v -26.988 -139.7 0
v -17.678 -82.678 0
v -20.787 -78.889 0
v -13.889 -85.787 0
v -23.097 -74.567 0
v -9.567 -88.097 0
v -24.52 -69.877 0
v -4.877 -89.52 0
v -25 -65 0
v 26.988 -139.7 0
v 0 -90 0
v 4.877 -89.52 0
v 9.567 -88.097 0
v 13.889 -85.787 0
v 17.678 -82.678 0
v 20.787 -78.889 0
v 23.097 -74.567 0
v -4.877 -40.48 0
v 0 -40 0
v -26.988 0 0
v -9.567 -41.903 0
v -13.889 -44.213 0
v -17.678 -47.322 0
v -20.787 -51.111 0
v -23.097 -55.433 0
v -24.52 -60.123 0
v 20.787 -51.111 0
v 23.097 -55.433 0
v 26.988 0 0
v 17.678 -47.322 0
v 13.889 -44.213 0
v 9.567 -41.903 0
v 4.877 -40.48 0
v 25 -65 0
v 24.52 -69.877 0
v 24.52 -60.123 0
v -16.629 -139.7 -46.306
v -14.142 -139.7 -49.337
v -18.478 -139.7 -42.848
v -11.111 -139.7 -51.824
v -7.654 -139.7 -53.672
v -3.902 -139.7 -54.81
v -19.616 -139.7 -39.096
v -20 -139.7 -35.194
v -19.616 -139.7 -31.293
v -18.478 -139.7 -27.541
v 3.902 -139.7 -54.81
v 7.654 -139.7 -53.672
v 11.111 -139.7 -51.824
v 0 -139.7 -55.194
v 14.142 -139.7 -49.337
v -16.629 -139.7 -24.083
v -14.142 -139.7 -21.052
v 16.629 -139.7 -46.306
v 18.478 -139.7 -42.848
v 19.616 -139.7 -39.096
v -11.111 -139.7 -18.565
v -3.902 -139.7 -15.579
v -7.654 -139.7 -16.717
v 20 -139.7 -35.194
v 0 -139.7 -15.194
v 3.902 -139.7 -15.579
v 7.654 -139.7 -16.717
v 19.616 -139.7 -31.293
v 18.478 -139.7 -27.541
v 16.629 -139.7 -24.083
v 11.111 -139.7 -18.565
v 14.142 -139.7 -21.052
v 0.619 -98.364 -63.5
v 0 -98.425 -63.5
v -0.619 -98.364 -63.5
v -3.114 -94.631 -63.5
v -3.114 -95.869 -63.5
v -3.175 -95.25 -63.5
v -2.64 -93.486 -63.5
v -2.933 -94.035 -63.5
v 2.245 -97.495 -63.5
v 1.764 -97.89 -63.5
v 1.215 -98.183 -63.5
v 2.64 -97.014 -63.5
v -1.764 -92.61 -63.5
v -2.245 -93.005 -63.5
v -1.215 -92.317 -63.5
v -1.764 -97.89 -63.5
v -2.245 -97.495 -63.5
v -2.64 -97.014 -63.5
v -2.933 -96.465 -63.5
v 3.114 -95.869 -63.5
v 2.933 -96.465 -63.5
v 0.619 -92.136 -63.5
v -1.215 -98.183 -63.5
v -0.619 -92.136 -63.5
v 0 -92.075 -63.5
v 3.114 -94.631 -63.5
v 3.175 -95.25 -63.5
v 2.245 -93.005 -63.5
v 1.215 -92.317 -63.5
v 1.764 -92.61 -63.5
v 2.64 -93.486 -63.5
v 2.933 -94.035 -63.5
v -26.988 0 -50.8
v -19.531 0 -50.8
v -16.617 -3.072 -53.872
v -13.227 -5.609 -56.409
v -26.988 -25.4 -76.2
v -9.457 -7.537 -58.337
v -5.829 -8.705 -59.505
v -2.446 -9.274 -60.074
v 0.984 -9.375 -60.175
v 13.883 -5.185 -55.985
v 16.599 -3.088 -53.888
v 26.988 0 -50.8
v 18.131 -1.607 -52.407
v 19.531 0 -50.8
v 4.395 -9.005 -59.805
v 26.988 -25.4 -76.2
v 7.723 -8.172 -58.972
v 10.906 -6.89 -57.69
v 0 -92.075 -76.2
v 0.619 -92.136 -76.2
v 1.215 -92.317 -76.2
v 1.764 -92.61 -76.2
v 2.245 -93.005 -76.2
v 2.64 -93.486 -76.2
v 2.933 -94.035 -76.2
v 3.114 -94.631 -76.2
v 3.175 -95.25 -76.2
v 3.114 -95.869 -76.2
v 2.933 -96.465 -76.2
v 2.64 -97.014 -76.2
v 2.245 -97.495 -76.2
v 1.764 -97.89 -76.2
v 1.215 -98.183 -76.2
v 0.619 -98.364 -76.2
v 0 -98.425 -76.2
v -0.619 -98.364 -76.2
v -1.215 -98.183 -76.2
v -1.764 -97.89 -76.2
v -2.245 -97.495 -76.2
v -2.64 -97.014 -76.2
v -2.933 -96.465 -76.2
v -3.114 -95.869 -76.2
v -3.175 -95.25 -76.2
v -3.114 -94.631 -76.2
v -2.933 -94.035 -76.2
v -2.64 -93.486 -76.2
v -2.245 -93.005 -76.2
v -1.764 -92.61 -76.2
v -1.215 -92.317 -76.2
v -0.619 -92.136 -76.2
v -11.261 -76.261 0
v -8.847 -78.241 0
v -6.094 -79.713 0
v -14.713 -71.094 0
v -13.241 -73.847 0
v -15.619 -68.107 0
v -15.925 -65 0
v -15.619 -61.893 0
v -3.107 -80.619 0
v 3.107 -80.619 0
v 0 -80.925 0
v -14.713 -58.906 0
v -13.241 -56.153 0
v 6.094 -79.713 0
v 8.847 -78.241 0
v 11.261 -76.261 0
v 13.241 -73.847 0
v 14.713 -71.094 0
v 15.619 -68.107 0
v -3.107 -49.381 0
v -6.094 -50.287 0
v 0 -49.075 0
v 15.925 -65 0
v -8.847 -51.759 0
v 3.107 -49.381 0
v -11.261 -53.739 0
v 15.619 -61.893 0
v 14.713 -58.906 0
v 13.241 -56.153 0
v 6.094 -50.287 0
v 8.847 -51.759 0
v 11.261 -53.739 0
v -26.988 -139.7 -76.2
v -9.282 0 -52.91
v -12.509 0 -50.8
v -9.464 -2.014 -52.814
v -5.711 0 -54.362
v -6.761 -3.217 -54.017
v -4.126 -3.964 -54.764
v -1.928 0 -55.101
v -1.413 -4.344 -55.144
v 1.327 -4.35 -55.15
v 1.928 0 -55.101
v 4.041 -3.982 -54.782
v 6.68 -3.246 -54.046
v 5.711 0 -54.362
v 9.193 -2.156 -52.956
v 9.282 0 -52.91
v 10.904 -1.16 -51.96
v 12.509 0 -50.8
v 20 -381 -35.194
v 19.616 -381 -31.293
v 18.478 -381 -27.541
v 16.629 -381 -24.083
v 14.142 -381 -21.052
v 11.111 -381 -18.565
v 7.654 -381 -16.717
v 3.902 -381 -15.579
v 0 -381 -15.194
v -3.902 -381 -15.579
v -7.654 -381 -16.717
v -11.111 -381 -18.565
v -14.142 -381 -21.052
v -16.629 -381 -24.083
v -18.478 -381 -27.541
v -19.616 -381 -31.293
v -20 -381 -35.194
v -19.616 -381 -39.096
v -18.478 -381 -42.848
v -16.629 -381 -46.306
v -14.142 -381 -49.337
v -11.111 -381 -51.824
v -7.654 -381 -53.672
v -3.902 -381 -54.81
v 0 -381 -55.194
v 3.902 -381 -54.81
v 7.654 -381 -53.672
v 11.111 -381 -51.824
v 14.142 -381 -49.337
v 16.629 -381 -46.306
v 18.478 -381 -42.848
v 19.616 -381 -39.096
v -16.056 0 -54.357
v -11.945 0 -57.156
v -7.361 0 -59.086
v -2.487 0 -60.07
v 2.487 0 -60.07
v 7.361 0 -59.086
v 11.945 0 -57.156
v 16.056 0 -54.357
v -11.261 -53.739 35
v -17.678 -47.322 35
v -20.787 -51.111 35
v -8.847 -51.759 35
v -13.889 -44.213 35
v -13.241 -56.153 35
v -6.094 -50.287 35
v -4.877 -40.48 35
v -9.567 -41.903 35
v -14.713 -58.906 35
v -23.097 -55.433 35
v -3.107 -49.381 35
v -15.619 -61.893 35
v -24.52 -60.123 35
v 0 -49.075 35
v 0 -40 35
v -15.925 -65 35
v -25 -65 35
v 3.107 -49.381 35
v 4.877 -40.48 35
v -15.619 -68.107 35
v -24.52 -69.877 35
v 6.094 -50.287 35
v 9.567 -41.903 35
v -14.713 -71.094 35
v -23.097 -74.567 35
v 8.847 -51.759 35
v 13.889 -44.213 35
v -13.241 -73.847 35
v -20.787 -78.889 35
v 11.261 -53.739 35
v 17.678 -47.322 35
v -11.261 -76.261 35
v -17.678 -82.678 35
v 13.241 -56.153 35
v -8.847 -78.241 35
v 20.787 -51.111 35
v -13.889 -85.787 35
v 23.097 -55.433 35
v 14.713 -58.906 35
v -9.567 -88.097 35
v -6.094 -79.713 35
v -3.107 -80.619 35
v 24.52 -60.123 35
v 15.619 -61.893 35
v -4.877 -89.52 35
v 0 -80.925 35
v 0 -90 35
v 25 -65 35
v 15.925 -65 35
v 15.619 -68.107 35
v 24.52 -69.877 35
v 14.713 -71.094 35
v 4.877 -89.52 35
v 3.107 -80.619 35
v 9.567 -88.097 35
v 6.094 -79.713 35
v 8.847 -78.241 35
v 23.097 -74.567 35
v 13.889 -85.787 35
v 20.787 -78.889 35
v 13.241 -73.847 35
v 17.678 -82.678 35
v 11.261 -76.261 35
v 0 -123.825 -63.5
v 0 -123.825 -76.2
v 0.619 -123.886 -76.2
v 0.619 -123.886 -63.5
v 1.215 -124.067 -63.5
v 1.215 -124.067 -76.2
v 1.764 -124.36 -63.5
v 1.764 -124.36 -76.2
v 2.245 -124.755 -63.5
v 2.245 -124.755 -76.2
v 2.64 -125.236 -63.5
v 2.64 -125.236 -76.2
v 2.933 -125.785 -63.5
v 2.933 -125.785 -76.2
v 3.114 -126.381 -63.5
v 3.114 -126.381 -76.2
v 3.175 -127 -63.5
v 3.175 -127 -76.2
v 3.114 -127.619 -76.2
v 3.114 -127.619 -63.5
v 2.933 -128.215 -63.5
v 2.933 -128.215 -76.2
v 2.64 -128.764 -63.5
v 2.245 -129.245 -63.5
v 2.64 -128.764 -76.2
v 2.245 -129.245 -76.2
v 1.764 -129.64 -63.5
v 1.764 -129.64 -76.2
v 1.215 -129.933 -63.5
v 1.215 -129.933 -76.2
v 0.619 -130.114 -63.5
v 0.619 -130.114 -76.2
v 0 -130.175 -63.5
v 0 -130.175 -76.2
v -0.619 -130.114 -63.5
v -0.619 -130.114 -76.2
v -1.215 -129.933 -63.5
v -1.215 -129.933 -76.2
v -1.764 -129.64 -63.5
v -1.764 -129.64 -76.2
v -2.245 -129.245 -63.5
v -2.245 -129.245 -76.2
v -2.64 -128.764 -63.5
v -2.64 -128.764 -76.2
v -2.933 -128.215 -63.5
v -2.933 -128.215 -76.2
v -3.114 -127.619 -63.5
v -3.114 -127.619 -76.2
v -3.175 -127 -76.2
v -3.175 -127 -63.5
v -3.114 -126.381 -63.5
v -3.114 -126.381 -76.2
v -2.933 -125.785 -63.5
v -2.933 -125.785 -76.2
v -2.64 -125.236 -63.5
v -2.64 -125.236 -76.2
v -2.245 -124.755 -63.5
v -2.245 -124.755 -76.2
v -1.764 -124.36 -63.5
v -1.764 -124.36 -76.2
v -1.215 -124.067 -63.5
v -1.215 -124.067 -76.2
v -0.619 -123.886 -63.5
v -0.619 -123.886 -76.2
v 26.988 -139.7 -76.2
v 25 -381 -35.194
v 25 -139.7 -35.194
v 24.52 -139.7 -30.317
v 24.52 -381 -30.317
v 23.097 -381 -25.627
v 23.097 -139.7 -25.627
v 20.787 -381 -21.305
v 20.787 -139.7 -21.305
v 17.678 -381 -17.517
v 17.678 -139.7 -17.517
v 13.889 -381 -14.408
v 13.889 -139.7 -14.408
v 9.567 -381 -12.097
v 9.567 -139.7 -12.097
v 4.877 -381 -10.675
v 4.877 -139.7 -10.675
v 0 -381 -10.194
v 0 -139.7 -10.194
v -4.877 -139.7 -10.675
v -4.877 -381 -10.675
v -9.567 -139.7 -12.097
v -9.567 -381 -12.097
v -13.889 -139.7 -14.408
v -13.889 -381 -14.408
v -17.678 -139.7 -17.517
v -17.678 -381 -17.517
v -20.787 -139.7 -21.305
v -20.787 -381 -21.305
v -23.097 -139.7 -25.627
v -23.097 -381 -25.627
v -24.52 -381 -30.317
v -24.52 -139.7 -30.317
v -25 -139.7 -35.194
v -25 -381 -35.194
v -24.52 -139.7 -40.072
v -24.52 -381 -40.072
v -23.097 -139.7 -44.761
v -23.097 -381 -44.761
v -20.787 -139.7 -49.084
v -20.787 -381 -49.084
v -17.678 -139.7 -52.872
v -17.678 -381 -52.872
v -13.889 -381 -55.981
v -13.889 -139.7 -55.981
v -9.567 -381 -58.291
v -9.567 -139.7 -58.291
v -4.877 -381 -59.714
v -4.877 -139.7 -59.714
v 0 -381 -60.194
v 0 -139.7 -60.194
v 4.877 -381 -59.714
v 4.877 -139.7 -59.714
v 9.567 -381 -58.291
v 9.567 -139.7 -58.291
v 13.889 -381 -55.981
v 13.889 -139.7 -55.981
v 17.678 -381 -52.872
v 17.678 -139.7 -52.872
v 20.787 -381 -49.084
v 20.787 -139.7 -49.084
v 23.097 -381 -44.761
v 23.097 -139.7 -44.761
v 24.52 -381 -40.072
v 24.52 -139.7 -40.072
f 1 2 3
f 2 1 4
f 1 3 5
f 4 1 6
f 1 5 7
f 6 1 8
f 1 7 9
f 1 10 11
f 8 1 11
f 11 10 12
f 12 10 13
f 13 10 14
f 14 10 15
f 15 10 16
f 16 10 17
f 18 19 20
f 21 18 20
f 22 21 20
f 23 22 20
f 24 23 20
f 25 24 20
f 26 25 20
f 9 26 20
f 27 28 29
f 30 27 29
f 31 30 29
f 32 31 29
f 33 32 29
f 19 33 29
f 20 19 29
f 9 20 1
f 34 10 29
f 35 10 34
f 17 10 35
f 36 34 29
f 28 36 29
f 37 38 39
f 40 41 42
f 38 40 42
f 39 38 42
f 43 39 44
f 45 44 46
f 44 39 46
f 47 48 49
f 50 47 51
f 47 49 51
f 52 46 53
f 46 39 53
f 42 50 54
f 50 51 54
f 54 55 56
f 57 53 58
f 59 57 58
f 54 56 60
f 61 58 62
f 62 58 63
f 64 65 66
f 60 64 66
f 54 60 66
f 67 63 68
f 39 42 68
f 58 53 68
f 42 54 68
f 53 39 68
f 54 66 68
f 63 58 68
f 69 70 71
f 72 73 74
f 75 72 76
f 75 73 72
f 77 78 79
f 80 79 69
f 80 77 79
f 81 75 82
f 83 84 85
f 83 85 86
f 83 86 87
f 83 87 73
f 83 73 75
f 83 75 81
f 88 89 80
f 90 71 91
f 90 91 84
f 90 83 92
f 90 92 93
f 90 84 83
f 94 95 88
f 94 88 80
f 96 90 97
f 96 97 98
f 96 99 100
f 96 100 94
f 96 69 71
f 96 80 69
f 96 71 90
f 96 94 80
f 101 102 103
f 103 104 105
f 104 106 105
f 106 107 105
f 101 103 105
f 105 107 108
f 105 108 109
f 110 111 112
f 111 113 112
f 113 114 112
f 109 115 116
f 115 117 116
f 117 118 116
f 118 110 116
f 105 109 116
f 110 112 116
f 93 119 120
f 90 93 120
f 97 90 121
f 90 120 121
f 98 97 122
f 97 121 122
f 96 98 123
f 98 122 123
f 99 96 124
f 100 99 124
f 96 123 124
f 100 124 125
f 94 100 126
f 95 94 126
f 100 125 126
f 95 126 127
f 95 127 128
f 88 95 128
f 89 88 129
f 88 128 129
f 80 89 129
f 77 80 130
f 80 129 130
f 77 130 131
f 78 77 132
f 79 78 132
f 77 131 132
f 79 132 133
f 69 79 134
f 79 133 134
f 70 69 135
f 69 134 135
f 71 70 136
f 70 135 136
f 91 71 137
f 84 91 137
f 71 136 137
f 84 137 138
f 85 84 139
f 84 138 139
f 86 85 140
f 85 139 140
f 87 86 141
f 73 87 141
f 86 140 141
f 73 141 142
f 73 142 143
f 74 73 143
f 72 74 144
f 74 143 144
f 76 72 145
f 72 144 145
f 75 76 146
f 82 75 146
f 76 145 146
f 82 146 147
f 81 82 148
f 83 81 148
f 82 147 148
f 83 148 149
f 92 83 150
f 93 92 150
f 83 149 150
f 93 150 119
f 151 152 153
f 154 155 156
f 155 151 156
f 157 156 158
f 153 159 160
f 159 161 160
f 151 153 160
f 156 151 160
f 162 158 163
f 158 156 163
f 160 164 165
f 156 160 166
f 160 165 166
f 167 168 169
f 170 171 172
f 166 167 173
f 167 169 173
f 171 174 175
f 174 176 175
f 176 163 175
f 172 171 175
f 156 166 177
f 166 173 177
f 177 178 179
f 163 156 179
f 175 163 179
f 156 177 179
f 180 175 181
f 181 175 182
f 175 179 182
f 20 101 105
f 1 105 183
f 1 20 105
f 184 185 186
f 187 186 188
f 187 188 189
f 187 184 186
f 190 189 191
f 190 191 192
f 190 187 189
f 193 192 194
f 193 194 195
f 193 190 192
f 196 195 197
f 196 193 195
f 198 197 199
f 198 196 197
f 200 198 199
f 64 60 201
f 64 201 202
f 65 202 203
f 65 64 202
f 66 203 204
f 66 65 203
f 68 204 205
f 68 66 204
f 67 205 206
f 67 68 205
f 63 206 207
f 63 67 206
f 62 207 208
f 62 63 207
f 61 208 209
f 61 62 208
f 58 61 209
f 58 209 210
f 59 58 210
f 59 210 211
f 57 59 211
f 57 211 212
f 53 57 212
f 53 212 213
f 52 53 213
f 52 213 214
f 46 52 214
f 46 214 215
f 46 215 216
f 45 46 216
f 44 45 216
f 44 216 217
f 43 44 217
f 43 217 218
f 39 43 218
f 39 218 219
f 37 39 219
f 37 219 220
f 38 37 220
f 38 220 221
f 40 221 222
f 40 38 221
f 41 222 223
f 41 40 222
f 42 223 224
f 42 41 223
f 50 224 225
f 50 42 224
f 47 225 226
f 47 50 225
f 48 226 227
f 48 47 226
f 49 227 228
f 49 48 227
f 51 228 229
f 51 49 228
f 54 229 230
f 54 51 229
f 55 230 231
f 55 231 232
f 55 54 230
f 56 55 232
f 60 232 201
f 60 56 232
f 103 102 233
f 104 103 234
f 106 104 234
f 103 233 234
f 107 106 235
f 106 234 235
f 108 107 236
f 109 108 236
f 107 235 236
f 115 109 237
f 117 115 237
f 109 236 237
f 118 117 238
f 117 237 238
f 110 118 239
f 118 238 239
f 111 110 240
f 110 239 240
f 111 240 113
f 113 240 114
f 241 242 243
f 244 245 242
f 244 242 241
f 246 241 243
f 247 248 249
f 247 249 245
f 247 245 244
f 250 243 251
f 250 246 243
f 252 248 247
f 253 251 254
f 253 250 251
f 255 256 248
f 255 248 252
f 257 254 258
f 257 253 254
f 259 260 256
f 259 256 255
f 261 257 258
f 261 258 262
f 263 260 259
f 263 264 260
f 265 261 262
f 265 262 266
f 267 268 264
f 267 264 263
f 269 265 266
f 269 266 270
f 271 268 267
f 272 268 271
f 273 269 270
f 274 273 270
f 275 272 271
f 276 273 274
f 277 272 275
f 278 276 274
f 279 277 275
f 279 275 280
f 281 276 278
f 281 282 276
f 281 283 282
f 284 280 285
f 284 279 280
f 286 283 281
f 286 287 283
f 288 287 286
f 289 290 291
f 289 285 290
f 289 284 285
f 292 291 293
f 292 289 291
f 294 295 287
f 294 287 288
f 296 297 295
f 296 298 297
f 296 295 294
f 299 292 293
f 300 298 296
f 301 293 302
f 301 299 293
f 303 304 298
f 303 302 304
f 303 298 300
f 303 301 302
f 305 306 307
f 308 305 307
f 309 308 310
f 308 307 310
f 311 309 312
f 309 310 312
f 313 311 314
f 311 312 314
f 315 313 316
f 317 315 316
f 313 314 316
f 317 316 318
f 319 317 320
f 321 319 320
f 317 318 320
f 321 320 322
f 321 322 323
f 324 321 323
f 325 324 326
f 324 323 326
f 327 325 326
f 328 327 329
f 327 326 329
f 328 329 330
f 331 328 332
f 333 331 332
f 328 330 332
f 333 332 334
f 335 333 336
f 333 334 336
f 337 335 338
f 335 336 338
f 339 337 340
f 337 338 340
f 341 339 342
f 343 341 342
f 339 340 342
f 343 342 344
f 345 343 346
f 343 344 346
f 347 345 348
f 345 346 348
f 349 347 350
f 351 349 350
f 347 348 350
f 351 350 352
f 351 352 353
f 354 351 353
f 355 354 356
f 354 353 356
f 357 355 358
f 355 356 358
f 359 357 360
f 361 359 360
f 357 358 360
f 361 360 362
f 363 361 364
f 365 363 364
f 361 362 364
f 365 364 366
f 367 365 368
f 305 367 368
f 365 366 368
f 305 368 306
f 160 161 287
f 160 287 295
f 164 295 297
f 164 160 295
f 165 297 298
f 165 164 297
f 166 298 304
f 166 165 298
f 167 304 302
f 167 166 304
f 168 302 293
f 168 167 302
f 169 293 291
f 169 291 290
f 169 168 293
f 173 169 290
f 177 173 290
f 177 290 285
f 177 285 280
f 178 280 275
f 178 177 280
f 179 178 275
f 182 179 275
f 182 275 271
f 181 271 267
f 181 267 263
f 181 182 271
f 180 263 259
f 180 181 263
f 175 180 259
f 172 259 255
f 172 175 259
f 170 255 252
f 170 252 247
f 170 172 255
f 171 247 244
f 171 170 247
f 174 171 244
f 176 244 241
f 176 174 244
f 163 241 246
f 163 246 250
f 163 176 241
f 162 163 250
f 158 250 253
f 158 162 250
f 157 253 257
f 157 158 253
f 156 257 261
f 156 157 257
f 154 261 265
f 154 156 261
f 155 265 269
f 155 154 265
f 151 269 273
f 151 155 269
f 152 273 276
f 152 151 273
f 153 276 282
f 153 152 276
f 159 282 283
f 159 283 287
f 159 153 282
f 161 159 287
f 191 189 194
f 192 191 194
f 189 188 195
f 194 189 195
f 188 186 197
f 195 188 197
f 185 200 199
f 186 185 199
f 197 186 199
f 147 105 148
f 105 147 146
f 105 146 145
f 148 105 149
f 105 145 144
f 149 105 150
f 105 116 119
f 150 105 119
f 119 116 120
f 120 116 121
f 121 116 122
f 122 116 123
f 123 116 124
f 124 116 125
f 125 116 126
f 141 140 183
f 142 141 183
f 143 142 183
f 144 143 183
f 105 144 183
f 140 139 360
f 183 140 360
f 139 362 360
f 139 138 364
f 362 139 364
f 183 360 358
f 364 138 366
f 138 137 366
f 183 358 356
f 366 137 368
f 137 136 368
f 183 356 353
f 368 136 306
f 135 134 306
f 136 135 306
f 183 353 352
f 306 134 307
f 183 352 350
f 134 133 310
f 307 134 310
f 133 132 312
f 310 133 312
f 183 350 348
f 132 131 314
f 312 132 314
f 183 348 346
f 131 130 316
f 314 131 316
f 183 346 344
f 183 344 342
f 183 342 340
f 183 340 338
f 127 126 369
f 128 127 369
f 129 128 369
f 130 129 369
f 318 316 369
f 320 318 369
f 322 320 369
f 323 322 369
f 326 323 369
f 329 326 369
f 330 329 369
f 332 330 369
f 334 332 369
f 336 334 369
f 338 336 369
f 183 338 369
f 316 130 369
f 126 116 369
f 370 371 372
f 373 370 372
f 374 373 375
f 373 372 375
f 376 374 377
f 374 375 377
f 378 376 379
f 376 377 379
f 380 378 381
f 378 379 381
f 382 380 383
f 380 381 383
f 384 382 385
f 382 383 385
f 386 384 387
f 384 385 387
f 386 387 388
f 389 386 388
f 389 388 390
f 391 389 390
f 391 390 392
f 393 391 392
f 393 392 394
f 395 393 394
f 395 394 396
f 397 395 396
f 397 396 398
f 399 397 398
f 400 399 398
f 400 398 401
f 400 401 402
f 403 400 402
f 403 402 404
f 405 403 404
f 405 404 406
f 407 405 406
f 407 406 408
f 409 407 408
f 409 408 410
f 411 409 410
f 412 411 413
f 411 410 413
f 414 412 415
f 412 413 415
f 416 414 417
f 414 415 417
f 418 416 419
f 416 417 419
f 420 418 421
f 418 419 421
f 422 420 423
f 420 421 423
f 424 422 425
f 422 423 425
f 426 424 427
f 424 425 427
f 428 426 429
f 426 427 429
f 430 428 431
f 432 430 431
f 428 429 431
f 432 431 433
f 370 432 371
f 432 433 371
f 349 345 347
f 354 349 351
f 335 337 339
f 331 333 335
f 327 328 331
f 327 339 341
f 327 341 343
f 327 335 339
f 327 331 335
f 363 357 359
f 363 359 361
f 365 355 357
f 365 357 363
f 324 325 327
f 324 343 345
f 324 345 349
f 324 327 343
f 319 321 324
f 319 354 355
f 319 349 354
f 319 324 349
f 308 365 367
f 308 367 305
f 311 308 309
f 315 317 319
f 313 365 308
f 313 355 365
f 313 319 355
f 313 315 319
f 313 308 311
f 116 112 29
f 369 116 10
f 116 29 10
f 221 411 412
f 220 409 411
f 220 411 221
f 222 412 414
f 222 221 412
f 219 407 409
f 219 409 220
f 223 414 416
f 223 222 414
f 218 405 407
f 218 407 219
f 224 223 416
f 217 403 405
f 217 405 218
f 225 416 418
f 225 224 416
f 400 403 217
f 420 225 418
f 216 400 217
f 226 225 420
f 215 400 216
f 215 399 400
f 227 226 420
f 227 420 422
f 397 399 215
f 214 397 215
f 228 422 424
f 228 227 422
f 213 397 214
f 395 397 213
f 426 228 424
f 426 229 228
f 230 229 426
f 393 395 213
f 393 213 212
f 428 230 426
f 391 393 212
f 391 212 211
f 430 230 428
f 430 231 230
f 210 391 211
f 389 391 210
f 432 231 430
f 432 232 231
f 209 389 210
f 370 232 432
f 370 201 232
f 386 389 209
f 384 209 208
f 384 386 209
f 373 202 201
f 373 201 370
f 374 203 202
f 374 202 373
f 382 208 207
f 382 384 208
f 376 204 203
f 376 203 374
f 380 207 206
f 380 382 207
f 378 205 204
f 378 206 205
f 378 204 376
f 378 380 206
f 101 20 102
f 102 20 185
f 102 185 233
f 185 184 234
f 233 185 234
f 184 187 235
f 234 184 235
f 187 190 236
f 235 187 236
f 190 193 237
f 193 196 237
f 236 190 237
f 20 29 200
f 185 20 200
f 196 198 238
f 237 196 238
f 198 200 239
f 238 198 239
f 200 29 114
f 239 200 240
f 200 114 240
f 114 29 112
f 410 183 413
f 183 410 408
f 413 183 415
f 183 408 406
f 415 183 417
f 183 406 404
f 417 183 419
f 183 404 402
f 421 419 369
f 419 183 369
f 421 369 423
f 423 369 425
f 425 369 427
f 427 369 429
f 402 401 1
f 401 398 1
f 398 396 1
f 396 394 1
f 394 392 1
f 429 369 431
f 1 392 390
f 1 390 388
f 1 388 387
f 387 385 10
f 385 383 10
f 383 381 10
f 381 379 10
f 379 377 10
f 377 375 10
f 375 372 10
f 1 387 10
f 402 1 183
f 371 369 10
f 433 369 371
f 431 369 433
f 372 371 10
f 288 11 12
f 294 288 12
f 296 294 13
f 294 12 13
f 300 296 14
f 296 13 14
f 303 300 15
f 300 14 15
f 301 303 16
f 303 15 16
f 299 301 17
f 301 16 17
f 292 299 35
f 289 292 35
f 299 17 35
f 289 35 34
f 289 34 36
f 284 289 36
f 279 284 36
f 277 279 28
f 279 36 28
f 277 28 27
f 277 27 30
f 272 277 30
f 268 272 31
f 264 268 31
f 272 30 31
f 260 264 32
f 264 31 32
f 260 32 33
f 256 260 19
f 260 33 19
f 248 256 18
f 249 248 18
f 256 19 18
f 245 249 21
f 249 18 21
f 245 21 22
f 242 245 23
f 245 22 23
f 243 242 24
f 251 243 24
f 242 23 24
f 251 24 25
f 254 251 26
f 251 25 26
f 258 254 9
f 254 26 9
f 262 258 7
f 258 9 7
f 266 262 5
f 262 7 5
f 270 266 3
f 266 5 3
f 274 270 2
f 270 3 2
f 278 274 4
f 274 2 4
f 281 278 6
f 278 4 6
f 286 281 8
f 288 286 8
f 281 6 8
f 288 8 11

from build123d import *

# Parameters (mm, degrees)
PAD_DEPTH     = 26.9875
SKETCH001_R   = 25
SKETCH001_R_2 = 15.925
PAD001_DEPTH  = 35
SKETCH002_R   = 25
SKETCH002_R_2 = 20
PAD002_DEPTH  = 381
SKETCH003_R   = 3.175
POCKET_DEPTH  = 12.7


with BuildPart() as part:
    # Sketch → Pad (new body, symmetric)
    with BuildSketch(Plane.YZ):
        Polygon((-25.4, -76.2), (-139.7, -76.2), (-139.7, 0), (0, 0), (0, -50.8), align=None)
    extrude(amount=PAD_DEPTH, both=True)

    # Sketch001 (on Face3 of Pad) → Pad001 (join)
    with BuildSketch(Plane(origin=(0, 0, 0), x_dir=(0, -1, 0), z_dir=(0, 0, 1))):
        with Locations((65, 0)):
            Circle(SKETCH001_R)
        with Locations((65, 0)):
            Circle(SKETCH001_R_2, mode=Mode.SUBTRACT)
    extrude(amount=PAD001_DEPTH)

    # Sketch002 → Pad002 (join)
    with BuildSketch(Plane.XZ):
        with Locations((0, -35.194401)):
            Circle(SKETCH002_R)
        with Locations((0, -35.194401)):
            Circle(SKETCH002_R_2, mode=Mode.SUBTRACT)
    extrude(amount=PAD002_DEPTH)

    # Sketch003 (on Face1 of Pad002) → Pocket (cut)
    with BuildSketch(Plane.YX.offset(76.2)):
        with Locations((-127, 0)):
            Circle(SKETCH003_R)
        with Locations((-95.25, 0)):
            Circle(SKETCH003_R)
    extrude(amount=-POCKET_DEPTH, mode=Mode.SUBTRACT)


solid = part.part
